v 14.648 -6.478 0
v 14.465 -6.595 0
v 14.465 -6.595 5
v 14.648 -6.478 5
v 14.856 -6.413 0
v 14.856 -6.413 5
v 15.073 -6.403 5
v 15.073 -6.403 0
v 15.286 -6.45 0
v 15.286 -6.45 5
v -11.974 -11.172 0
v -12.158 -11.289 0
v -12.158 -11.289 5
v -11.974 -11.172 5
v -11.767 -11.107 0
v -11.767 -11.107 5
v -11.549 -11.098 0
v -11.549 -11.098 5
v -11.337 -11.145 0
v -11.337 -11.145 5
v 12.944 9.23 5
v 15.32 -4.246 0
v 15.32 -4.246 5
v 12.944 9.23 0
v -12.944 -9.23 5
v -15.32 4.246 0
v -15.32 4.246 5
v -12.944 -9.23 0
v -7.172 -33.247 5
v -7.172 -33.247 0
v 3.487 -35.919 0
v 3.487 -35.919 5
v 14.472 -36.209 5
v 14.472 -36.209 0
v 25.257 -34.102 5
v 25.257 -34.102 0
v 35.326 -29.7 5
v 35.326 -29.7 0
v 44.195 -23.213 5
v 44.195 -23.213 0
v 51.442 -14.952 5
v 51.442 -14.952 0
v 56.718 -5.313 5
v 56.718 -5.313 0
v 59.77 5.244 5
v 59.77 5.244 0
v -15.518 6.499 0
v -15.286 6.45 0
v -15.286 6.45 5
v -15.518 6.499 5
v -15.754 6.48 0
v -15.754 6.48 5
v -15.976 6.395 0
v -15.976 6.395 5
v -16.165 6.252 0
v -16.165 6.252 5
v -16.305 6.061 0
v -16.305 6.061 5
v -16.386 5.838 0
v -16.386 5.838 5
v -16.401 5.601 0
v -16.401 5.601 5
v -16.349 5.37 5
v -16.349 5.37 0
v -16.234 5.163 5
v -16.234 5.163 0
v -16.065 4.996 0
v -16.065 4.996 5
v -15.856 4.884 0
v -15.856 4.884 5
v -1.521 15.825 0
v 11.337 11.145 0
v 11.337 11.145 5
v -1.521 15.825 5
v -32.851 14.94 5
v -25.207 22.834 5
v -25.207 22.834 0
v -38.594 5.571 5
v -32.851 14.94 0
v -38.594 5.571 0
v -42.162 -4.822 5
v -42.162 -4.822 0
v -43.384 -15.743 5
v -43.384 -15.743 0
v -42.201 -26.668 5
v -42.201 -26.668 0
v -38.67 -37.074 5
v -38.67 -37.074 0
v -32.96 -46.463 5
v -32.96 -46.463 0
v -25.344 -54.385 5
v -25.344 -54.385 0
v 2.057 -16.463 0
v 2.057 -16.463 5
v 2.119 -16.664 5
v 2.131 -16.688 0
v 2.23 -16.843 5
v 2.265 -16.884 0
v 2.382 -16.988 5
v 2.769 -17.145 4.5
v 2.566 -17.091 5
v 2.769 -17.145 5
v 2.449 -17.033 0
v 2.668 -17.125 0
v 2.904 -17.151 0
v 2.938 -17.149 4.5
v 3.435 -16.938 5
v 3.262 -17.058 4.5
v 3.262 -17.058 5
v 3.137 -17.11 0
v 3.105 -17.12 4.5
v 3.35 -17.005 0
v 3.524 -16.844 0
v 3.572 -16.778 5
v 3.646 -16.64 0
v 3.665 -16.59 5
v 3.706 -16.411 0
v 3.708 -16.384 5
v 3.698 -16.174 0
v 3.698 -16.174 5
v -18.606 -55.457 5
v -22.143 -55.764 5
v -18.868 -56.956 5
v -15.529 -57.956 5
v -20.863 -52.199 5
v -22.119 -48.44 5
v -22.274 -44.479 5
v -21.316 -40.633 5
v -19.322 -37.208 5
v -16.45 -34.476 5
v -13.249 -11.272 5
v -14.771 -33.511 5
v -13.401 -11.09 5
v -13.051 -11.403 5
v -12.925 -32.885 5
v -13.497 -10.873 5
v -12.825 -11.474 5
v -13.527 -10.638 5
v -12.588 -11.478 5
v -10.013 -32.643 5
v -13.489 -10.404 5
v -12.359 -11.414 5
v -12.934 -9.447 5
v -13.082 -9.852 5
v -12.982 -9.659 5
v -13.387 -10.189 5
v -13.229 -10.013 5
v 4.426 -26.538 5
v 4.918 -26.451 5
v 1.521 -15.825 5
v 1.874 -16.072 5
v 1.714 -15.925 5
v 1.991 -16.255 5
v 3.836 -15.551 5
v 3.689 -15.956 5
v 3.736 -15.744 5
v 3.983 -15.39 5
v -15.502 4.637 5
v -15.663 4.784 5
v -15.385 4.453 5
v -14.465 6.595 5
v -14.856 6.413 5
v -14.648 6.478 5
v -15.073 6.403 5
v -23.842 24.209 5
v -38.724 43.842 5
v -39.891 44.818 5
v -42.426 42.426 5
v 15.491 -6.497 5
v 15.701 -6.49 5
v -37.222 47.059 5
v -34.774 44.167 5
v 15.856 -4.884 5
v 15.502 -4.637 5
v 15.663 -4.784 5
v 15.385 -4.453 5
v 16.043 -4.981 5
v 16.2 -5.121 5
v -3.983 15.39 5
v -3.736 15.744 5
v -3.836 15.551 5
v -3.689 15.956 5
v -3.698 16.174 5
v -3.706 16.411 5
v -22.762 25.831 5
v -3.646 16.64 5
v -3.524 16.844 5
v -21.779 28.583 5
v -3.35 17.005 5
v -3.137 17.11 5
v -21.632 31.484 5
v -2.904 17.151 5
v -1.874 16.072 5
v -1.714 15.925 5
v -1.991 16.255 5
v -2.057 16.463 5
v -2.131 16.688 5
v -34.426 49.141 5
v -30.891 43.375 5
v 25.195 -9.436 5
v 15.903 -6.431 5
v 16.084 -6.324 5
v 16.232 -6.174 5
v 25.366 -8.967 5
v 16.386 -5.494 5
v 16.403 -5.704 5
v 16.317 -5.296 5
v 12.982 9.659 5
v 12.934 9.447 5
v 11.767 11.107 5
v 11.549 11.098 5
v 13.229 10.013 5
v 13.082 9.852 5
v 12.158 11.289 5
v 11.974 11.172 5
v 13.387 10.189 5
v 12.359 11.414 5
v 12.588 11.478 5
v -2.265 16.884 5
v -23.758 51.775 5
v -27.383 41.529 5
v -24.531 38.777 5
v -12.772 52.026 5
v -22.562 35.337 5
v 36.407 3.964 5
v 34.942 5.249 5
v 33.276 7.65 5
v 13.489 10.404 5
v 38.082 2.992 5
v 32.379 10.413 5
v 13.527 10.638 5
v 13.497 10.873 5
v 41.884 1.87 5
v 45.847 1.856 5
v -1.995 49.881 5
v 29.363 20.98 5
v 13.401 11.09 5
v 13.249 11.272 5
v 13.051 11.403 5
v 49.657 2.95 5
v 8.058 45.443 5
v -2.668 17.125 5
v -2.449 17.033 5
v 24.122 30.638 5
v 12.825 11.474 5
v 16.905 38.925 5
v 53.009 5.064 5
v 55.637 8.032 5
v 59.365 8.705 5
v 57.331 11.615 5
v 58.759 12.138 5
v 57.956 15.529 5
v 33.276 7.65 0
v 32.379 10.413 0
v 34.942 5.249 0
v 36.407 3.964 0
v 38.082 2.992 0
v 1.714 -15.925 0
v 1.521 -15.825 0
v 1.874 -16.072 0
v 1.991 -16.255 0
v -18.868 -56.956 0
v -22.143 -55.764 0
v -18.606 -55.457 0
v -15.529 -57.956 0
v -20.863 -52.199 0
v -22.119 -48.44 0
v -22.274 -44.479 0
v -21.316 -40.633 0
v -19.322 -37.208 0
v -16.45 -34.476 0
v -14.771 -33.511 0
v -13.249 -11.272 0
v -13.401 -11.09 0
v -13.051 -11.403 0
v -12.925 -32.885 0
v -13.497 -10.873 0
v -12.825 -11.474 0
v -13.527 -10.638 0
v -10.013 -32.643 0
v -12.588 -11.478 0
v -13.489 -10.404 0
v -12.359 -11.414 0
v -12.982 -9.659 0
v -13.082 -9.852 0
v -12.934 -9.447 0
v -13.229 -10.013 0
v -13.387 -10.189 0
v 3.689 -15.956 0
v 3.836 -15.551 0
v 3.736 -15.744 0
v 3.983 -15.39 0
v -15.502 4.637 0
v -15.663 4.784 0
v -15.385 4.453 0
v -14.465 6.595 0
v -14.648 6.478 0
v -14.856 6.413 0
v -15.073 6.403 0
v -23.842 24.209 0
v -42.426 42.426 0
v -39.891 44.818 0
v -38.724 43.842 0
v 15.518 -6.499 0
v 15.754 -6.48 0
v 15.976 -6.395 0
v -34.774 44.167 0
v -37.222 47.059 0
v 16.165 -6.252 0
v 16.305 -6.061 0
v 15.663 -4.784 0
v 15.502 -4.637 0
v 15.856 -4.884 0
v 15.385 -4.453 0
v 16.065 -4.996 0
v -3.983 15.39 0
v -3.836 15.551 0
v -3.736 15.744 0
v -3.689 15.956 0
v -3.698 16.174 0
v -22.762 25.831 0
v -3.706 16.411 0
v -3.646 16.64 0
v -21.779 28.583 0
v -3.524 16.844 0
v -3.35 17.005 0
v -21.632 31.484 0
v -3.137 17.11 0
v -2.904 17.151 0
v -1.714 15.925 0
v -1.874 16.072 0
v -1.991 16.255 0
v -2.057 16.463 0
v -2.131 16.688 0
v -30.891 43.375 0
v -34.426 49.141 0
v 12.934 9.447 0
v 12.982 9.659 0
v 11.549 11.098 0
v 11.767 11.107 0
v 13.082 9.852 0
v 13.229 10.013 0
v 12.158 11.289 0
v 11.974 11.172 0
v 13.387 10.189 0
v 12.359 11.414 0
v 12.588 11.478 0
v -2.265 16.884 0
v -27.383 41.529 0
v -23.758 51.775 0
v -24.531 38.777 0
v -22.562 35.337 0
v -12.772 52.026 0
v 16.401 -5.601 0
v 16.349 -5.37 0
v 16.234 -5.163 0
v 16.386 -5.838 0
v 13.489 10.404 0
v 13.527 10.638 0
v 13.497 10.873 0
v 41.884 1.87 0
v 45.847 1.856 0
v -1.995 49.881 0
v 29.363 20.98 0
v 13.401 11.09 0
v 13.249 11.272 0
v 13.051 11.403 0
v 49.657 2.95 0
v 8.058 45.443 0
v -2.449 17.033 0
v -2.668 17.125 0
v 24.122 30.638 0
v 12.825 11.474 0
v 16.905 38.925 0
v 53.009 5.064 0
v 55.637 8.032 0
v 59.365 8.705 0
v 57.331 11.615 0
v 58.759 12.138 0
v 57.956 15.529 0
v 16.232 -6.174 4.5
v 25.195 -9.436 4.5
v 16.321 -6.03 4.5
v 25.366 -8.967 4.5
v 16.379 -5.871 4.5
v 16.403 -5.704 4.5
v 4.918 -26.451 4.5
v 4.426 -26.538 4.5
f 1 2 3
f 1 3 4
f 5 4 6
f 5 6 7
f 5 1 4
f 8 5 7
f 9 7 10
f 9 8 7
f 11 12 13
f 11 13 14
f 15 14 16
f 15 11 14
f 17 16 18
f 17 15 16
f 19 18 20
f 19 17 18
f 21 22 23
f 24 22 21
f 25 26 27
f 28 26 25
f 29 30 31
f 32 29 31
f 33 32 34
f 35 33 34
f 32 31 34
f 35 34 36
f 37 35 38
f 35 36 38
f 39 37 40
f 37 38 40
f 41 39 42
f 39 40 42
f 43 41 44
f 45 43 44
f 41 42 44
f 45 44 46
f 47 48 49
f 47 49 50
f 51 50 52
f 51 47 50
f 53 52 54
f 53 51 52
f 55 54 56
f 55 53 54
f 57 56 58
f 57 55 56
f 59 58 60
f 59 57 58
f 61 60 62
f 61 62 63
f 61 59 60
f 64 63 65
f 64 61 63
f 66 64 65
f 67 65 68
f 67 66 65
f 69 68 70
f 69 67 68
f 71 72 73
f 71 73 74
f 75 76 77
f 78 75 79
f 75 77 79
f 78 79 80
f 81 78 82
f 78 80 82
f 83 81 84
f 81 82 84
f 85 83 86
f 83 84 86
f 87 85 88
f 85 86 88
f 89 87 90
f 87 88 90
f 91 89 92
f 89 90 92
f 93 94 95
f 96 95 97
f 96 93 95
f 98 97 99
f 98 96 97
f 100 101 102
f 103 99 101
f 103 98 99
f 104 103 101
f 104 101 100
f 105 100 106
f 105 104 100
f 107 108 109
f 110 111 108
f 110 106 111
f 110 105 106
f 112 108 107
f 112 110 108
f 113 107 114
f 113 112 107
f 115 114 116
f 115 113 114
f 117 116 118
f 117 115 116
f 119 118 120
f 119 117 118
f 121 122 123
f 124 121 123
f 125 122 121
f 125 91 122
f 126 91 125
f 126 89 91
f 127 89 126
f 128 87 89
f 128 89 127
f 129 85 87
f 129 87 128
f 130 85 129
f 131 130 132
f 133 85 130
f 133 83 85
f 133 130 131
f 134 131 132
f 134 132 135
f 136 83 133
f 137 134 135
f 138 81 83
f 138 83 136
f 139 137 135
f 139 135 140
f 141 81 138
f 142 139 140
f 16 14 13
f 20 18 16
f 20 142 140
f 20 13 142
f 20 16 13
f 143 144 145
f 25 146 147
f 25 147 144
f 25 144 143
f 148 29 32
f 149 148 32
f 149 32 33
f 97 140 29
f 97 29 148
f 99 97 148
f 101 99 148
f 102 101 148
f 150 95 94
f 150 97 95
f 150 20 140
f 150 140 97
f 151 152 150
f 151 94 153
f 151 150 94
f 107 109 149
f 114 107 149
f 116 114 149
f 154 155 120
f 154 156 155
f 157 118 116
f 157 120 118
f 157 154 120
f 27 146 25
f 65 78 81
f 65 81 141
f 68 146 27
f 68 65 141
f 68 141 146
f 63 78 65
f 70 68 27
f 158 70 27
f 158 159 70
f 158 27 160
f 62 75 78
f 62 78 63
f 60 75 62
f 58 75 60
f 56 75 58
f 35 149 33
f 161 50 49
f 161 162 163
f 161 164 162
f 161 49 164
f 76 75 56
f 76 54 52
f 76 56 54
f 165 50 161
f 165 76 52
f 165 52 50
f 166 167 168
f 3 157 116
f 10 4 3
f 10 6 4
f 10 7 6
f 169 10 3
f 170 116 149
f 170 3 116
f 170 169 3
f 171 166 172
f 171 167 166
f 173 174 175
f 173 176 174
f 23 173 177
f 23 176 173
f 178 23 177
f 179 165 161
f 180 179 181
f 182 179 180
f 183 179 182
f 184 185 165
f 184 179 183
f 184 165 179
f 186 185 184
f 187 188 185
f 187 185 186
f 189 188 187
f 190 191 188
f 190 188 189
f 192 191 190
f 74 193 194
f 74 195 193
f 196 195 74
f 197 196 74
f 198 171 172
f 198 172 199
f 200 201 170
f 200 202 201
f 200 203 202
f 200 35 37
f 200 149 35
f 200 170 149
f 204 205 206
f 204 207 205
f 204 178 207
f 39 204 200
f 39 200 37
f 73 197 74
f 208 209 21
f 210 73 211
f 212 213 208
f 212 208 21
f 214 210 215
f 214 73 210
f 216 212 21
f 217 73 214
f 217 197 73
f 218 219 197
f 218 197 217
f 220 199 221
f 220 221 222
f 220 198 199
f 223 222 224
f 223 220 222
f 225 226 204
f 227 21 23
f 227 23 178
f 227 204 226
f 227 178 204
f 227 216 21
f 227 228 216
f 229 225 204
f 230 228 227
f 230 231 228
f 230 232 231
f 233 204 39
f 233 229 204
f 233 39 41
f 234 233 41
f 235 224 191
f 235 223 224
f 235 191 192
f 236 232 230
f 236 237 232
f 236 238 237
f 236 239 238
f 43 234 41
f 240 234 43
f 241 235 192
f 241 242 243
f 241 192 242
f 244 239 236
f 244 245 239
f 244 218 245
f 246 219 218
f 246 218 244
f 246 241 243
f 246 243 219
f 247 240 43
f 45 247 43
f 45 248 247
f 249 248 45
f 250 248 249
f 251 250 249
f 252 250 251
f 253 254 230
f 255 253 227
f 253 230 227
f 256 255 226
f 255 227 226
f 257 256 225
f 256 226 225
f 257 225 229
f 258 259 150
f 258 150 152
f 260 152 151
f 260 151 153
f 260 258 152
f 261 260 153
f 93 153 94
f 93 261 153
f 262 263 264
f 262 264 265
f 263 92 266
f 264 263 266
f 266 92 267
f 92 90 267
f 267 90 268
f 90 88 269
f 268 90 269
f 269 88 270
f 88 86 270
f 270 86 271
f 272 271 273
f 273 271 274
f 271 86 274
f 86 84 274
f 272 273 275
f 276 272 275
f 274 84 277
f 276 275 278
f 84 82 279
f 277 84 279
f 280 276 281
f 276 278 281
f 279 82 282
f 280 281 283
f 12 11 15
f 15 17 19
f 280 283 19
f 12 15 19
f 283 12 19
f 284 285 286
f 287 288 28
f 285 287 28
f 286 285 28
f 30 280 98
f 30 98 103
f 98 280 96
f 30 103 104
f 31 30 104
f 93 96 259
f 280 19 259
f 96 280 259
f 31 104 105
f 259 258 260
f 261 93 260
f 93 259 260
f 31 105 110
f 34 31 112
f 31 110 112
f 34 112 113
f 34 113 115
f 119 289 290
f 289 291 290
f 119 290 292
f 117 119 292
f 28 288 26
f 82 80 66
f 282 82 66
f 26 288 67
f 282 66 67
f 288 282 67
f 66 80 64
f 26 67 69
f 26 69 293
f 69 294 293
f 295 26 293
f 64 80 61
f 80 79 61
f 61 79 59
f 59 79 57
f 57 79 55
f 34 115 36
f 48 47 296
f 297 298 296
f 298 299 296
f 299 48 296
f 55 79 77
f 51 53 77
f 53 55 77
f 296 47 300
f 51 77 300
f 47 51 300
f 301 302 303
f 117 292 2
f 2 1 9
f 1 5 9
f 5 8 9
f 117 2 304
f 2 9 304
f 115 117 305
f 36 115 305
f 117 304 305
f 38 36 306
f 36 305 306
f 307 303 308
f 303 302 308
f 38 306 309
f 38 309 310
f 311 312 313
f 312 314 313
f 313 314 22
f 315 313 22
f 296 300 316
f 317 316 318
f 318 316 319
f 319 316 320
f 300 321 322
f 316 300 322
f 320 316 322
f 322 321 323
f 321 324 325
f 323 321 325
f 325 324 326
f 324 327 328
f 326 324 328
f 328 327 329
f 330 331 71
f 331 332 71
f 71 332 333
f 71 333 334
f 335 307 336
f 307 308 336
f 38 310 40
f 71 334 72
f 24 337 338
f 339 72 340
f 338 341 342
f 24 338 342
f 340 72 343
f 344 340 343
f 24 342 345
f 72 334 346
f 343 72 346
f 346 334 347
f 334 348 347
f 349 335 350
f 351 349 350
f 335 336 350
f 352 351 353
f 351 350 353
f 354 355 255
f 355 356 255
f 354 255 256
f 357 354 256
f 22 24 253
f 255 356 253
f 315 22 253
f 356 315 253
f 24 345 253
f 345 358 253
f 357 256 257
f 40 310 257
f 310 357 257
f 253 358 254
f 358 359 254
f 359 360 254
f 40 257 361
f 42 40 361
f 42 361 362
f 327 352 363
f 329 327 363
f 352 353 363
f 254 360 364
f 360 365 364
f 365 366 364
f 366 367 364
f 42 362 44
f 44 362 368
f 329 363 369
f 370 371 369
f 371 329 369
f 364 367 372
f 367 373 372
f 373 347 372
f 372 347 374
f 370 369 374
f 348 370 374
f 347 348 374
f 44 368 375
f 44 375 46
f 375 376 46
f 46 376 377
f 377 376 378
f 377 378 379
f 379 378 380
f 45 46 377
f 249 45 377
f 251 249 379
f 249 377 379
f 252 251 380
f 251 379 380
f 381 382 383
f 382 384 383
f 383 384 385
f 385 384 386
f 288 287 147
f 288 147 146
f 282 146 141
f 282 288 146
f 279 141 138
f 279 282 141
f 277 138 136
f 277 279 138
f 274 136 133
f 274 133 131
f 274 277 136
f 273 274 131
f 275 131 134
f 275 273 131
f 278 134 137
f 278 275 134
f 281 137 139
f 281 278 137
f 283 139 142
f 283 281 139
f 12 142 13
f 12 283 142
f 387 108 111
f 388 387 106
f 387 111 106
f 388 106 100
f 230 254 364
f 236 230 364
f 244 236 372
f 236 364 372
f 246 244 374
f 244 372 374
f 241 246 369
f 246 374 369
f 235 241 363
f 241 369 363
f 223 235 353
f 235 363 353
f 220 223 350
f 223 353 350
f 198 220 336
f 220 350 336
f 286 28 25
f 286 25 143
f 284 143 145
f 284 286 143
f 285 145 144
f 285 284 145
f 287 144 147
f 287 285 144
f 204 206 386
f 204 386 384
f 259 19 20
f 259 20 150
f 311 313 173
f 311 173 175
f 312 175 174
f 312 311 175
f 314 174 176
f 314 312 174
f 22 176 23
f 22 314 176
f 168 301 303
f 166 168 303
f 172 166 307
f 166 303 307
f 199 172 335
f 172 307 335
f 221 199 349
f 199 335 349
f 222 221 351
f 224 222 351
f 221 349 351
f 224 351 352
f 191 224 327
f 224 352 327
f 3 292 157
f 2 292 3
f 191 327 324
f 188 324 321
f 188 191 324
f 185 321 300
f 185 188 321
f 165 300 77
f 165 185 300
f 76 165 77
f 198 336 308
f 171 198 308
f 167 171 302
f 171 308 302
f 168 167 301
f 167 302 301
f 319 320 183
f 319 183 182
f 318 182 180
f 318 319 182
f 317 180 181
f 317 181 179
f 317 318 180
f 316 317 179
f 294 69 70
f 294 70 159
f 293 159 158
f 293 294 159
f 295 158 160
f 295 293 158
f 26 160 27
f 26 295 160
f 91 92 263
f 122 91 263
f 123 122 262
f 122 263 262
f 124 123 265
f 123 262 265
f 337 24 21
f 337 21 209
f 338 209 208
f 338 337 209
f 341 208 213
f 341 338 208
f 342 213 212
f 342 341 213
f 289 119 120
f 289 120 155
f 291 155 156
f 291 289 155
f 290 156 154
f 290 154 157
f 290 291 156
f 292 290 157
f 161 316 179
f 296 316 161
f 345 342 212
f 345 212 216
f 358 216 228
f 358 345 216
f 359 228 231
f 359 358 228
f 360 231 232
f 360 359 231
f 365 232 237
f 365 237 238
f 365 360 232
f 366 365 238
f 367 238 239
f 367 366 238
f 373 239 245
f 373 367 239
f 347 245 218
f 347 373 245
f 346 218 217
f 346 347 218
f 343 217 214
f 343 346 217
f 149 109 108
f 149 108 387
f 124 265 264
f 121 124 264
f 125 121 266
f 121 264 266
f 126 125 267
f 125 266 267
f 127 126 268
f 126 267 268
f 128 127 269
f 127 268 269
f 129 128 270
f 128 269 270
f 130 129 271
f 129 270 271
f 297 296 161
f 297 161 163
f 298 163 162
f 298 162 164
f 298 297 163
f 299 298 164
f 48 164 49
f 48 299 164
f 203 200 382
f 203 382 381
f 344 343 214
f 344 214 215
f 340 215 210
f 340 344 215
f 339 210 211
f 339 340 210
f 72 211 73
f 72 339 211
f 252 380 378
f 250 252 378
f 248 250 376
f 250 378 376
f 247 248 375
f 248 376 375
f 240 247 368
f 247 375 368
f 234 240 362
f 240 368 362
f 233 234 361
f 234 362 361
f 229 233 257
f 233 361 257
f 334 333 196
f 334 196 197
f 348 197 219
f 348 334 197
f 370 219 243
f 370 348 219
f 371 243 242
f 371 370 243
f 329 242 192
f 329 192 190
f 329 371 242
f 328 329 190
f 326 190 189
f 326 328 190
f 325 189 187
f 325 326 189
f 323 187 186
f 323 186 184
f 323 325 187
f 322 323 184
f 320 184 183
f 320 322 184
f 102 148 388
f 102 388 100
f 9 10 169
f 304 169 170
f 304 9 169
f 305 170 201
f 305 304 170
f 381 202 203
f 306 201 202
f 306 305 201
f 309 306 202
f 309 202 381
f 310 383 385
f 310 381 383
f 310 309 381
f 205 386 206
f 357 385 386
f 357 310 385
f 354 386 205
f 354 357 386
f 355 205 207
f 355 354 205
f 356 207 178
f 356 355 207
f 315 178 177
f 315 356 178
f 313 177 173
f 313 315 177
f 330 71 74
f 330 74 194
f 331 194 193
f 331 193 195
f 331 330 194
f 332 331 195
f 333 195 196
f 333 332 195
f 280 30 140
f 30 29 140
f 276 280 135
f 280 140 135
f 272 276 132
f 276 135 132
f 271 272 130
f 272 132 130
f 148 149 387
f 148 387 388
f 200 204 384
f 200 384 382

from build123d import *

# Parameters (mm, degrees)
BOSS_EXTRUDE1_DEPTH = 5
FILLET1_R           = 10
CUT_EXTRUDE1_DEPTH  = 0.5


with BuildPart() as part:
    # Sketch1 → Boss-Extrude1 (new body)
    with BuildSketch(Plane.XY):
        with BuildLine():
            ThreePointArc((32.82300848, 7.156370874), (9.466254973, 44.595523799), (-34.426436475, 49.140822863))
            ThreePointArc((-34.426436475, 49.140822863), (-38.572797774, 45.958016405), (-42.426406871, 42.426406871))
            ThreePointArc((-42.426406871, 42.426406871), (-26.29235792, 40.654943242), (-22.609103215, 24.847373735))
            ThreePointArc((-22.609103215, 24.847373735), (-43.353983992, -14.099744614), (-25.343982725, -54.38457998))
            ThreePointArc((-25.343982725, -54.38457998), (-20.514410827, -56.38403097), (-15.529142706, -57.955549577))
            ThreePointArc((-15.529142706, -57.955549577), (-22.062034677, -43.097321505), (-10.213905264, -32.003744609))
            ThreePointArc((-10.213905264, -32.003744609), (33.887729018, -30.495779185), (59.7704192, 5.243757117))
            ThreePointArc((59.7704192, 5.243757117), (59.087208601, 10.426014565), (57.955549577, 15.529142706))
            ThreePointArc((57.955549577, 15.529142706), (48.354392597, 2.442378263), (32.82300848, 7.156370874))
        make_face()
        with BuildLine():
            Line((-3.983032008, 15.390433913), (-14.46497239, 6.595041605))
            ThreePointArc((-14.46497239, 6.595041605), (-14.855921916, 6.412738847), (-15.285645517, 6.45033479))
            ThreePointArc((-15.285645517, 6.45033479), (-16.353739487, 5.952274392), (-15.855679089, 4.884180422))
            ThreePointArc((-15.855679089, 4.884180422), (-15.502325506, 4.63675958), (-15.320022748, 4.245810053))
            Line((-15.320022748, 4.245810053), (-12.943959764, -9.229512752))
            ThreePointArc((-12.943959764, -9.229512752), (-12.981555707, -9.659236353), (-13.22897655, -10.012589936))
            ThreePointArc((-13.22897655, -10.012589936), (-13.331690578, -11.186616647), (-12.157663867, -11.289330674))
            ThreePointArc((-12.157663867, -11.289330674), (-11.76671434, -11.107027916), (-11.336990739, -11.14462386))
            Line((-11.336990739, -11.14462386), (1.521012626, -15.824554357))
            ThreePointArc((1.521012626, -15.824554357), (1.874366209, -16.071975199), (2.056668967, -16.462924726))
            ThreePointArc((2.056668967, -16.462924726), (3.02204891, -17.138891039), (3.698015222, -16.173511097))
            ThreePointArc((3.698015222, -16.173511097), (3.735611166, -15.743787496), (3.983032008, -15.390433913))
            Line((3.983032008, -15.390433913), (14.46497239, -6.595041605))
            ThreePointArc((14.46497239, -6.595041605), (14.855921916, -6.412738847), (15.285645517, -6.45033479))
            ThreePointArc((15.285645517, -6.45033479), (16.353739487, -5.952274392), (15.855679089, -4.884180422))
            ThreePointArc((15.855679089, -4.884180422), (15.502325506, -4.63675958), (15.320022748, -4.245810053))
            Line((15.320022748, -4.245810053), (12.943959764, 9.229512752))
            ThreePointArc((12.943959764, 9.229512752), (12.981555707, 9.659236353), (13.22897655, 10.012589936))
            ThreePointArc((13.22897655, 10.012589936), (13.331690578, 11.186616647), (12.157663867, 11.289330674))
            ThreePointArc((12.157663867, 11.289330674), (11.76671434, 11.107027916), (11.336990739, 11.14462386))
            Line((11.336990739, 11.14462386), (-1.521012626, 15.824554357))
            ThreePointArc((-1.521012626, 15.824554357), (-1.874366209, 16.071975199), (-2.056668967, 16.462924726))
            ThreePointArc((-2.056668967, 16.462924726), (-3.02204891, 17.138891039), (-3.698015222, 16.173511097))
            ThreePointArc((-3.698015222, 16.173511097), (-3.735611166, 15.743787496), (-3.983032008, 15.390433913))
        make_face(mode=Mode.SUBTRACT)
    extrude(amount=BOSS_EXTRUDE1_DEPTH)

    # Fillet1
    fillet1_edges = [part.edges().sort_by_distance(p)[0] for p in [
        (32.82300848, 7.156370874, 2.5),
        (-10.213905264, -32.003744609, 2.5),
        (-22.609103215, 24.847373735, 2.5),
    ]]
    fillet(fillet1_edges, radius=FILLET1_R)

    # Sketch2 → Cut-Extrude1 (cut)
    with BuildSketch(Plane.XY.offset(5)):
        Polygon((2.689022882, -16.689899207), (3.181426759, -16.603075118), (4.917908536, -26.451152648), (4.425504659, -26.537976737), align=None)
        Polygon((15.798388141, -6.016187476), (15.969398213, -5.546341165), (25.36632442, -8.966542599), (25.195314349, -9.436388909), align=None)
    extrude(amount=-CUT_EXTRUDE1_DEPTH, mode=Mode.SUBTRACT)


solid = part.part
